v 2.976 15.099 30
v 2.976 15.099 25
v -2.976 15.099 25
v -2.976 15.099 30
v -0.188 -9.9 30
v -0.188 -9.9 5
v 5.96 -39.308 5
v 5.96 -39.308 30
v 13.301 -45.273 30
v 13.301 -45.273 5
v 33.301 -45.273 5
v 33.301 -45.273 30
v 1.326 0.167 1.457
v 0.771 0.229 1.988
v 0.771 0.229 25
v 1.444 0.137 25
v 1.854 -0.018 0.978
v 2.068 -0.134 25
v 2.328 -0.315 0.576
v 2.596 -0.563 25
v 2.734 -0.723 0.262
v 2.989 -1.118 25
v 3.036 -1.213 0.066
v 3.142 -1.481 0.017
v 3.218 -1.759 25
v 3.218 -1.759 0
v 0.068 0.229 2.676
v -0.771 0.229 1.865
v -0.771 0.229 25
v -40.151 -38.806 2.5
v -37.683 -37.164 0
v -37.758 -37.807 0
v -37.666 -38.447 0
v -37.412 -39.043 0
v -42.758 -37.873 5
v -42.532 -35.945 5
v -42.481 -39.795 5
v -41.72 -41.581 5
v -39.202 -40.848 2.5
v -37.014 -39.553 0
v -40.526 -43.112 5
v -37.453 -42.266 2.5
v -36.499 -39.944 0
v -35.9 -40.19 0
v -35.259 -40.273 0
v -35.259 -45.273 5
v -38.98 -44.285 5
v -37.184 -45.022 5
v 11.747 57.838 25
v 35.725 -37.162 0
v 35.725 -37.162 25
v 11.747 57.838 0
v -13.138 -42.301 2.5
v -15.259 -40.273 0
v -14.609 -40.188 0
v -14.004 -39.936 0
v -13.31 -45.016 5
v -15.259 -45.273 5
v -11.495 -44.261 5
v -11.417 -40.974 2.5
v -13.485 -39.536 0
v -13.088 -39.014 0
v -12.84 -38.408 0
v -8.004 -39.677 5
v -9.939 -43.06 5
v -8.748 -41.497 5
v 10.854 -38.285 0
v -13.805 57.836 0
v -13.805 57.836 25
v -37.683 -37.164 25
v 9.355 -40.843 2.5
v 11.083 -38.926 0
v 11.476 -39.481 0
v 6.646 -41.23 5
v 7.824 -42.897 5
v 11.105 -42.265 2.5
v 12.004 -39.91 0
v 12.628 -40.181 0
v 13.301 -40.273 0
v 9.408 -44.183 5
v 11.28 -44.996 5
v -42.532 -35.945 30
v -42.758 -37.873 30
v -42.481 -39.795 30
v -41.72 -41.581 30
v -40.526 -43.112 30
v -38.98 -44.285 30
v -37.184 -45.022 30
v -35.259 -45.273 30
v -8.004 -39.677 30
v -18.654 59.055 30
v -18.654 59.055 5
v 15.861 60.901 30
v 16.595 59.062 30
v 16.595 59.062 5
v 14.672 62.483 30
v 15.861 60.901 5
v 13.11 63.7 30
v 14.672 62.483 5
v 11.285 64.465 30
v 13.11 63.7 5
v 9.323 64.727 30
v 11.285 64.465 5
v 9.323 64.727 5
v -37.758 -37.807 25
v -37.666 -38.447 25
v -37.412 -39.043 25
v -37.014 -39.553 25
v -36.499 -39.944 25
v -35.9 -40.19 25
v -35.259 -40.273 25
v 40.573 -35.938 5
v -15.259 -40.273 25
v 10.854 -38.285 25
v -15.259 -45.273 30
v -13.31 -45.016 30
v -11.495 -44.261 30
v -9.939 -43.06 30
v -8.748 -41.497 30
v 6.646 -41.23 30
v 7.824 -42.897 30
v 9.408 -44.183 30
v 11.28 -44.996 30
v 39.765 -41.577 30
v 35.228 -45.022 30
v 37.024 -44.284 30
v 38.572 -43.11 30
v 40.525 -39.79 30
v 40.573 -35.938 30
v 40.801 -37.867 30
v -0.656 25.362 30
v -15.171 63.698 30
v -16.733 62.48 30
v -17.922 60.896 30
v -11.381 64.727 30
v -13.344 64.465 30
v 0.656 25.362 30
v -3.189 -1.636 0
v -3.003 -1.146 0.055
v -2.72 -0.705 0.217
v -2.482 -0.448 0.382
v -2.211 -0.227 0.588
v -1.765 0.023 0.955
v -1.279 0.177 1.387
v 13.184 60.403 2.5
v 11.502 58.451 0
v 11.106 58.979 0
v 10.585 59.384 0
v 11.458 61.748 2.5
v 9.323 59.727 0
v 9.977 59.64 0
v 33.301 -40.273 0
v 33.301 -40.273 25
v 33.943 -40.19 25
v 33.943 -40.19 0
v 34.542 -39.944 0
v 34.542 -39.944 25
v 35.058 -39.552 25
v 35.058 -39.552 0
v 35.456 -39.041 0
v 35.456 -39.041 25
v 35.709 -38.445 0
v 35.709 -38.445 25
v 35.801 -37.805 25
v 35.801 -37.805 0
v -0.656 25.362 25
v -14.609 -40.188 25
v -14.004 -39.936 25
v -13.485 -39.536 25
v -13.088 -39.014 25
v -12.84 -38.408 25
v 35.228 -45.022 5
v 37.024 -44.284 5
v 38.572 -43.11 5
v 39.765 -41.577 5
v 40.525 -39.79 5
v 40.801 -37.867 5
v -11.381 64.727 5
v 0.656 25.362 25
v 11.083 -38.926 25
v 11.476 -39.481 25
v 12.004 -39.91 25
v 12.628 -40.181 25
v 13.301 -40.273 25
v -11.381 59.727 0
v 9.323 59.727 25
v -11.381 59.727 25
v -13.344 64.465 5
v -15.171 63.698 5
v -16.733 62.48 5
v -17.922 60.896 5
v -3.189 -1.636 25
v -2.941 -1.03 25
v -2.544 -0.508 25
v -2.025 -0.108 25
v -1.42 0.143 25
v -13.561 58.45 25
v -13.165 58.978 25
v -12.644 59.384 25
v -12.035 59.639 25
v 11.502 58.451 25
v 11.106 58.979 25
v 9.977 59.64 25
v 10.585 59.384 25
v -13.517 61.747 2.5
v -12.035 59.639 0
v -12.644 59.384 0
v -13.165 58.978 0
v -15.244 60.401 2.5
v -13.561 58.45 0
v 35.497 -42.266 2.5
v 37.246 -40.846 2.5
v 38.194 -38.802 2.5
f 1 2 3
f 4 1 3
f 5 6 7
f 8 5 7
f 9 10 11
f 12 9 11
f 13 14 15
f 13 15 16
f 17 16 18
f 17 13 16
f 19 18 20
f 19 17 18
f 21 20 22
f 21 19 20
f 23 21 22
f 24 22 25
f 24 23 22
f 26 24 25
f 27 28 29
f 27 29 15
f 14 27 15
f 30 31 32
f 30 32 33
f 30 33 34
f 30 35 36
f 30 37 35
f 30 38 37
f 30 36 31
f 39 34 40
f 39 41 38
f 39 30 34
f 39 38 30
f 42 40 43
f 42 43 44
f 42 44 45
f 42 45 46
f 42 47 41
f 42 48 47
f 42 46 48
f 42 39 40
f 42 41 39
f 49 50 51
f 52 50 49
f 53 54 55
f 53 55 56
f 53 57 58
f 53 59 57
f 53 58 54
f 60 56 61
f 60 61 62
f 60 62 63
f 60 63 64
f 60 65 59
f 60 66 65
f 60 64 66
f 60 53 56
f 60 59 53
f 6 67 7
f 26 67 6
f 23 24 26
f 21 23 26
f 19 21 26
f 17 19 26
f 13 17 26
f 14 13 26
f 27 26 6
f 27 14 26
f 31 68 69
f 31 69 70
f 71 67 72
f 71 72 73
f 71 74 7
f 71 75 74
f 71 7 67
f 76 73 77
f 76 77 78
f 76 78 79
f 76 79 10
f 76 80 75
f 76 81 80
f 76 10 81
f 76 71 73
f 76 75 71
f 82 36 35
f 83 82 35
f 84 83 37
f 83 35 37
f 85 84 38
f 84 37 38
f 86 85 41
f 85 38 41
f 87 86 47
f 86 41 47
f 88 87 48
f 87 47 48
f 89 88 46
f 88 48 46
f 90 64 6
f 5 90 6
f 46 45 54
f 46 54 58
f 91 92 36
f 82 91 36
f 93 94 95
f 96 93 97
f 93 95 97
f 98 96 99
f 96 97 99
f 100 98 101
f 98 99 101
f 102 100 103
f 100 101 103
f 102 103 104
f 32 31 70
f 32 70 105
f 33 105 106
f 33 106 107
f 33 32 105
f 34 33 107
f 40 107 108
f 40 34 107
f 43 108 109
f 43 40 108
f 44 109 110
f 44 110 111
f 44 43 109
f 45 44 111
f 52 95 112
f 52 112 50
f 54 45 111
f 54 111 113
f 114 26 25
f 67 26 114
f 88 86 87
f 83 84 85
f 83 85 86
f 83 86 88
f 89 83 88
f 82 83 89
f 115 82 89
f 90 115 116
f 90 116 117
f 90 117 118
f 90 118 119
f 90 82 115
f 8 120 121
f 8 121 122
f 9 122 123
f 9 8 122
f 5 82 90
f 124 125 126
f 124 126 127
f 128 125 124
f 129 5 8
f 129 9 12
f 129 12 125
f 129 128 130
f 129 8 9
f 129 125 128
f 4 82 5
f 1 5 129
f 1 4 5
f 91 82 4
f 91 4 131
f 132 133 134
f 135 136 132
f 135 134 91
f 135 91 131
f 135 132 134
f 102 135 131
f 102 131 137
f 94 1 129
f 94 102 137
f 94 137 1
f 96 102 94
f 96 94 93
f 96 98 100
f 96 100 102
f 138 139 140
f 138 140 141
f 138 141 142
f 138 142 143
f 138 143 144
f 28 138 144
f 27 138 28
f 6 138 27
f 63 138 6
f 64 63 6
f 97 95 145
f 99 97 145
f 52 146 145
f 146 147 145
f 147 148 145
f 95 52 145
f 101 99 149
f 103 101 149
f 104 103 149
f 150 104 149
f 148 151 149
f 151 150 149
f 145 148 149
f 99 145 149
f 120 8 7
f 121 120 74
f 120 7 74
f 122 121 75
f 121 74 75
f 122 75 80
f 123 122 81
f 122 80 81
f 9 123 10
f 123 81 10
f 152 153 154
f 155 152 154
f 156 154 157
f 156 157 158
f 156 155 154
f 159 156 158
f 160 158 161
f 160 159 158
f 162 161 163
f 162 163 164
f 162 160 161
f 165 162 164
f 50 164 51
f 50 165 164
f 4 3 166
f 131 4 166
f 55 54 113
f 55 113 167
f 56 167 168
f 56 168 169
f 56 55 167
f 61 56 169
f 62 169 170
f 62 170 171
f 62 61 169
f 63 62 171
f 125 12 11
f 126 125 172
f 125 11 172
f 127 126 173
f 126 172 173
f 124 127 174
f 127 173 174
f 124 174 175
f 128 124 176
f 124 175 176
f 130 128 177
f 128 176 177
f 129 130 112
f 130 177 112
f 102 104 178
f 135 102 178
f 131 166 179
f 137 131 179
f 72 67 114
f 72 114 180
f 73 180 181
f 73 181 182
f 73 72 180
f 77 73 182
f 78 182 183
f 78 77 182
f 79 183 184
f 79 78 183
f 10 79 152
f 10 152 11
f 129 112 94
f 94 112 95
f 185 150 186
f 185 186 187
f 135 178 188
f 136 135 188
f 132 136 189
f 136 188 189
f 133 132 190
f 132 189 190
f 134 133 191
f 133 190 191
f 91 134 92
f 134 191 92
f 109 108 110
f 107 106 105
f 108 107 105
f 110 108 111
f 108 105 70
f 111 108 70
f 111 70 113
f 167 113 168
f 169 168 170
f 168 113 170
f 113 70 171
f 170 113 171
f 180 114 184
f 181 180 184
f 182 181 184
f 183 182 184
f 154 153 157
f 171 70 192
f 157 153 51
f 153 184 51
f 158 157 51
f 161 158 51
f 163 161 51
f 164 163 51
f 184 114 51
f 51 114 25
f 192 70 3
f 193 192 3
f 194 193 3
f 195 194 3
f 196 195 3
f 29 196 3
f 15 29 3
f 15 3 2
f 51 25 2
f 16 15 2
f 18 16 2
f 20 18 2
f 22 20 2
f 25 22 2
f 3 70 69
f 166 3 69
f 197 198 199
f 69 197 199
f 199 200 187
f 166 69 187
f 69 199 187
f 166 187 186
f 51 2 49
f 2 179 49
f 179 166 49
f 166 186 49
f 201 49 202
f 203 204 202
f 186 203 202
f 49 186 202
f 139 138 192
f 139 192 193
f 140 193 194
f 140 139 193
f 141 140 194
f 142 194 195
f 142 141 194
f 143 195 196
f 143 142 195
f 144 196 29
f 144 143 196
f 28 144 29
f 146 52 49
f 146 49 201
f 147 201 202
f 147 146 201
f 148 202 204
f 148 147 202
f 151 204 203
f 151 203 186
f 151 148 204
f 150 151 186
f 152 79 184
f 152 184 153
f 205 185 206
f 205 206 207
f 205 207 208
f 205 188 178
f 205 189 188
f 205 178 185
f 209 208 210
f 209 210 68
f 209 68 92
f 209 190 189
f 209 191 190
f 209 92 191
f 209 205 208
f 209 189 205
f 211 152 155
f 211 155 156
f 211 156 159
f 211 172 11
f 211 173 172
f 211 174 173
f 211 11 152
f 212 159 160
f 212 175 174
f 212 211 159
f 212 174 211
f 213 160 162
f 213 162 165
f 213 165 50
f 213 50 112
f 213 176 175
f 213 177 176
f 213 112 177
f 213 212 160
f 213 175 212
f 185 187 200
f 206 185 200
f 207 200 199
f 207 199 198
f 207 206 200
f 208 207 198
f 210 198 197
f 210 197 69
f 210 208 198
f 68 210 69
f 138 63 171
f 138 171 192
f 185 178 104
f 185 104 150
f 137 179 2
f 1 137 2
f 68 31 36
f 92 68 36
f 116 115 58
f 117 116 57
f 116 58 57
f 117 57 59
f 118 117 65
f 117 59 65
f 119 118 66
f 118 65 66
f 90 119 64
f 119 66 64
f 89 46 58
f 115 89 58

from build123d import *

# Parameters (mm, degrees)
F1_DEPTH     = 30
F3_DEPTH     = 30
F4_DEPTH     = 25
F5_T1_DEPTH  = 97.9548533656
F5_T3_DEPTH  = 20
F5_T5_DEPTH  = 20.7033743208
F5_T7_DEPTH  = 97.9794901198
F5_T9_DEPTH  = 20
F5_T12_ANGLE = 75.8911885194
F5_T14_ANGLE = 104.1088114806
F5_T16_ANGLE = 75.2928746344
F5_T20_DEPTH = 43.6443917162
F5_T23_ANGLE = 75.8339831116
F5_T25_ANGLE = 104.1660168884
F5_T27_ANGLE = 78.1908320725
F5_T31_DEPTH = 42.9024259572
F5_T37_DEPTH = 42.9024259572
F5_T41_DEPTH = 43.6443917162


# Not quite as in the source:
# - a fillet or chamfer that OpenCascade refuses, or shapes differently, is made with other operations: its cross-section is extruded or revolved along the edge and cut away or added
# - the program builds the solid bodies; features that only make, move or delete a surface that nothing else refers to are left out


with BuildPart() as f1:
    # F0 (on Top) → F1 (new body)
    with BuildSketch(Plane.XY):
        with BuildLine():
            Line((9.3227045948, 64.7266464915), (-11.3806697261, 64.7266464915))
            ThreePointArc((-11.3806697261, 64.7266464915), (-15.9925167381, 63.1411090315), (-18.6544287642, 59.0548777281))
            Line((-18.6544287642, 59.0548777281), (-42.5323117917, -35.9451222719))
            ThreePointArc((-42.5323117917, -35.9451222719), (-41.1730152936, -42.3852005206), (-35.2585527536, -45.2733535085))
            Line((-35.2585527536, -45.2733535085), (-15.2585527536, -45.2733535085))
            ThreePointArc((-15.2585527536, -45.2733535085), (-10.6776494918, -43.7118150354), (-8.004281346, -39.6774402567))
            Line((-8.004281346, -39.6774402567), (-0.1883919579, -9.9001294455))
            Line((-0.1883919579, -9.9001294455), (5.9601953638, -39.3082485958))
            ThreePointArc((5.9601953638, -39.3082485958), (8.571852392, -43.5940799733), (13.3014552741, -45.2733535085))
            Line((13.3014552741, -45.2733535085), (33.3014552741, -45.2733535085))
            ThreePointArc((33.3014552741, -45.2733535085), (39.2182193635, -42.3822473792), (40.5733853395, -35.9378608981))
            Line((40.5733853395, -35.9378608981), (16.5946346602, 59.0621391019))
            ThreePointArc((16.5946346602, 59.0621391019), (13.9315984654, 63.1434105808), (9.3227045948, 64.7266464915))
        make_face()
        with BuildLine():
            ThreePointArc((9.3227045948, 59.7266464915), (10.8590025517, 59.1989011879), (11.7466812833, 57.8384773616))
            Line((11.7466812833, 57.8384773616), (35.7254319626, -37.1615226384))
            ThreePointArc((35.7254319626, -37.1615226384), (35.2737099706, -39.3096514654), (33.3014552741, -40.2733535085))
            Line((33.3014552741, -40.2733535085), (13.3014552741, -40.2733535085))
            ThreePointArc((13.3014552741, -40.2733535085), (11.72492098, -39.7135956635), (10.8543686373, -38.2849852043))
            Line((10.8543686373, -38.2849852043), (3.2176150905, -1.7591059289))
            ThreePointArc((3.2176150905, -1.7591059289), (2.3470627478, -0.3304954698), (0.7705284538, 0.2292623753))
            Line((0.7705284538, 0.2292623753), (-0.7705284538, 0.2292623753))
            ThreePointArc((-0.7705284538, 0.2292623753), (-2.2974962077, -0.2912504491), (-3.188618923, -1.6360420419))
            Line((-3.188618923, -1.6360420419), (-12.8404622844, -38.4080490913))
            ThreePointArc((-12.8404622844, -38.4080490913), (-13.7315849996, -39.7528406842), (-15.2585527536, -40.2733535085))
            Line((-15.2585527536, -40.2733535085), (-35.2585527536, -40.2733535085))
            ThreePointArc((-35.2585527536, -40.2733535085), (-37.2300402669, -39.3106358459), (-37.6831390996, -37.1639430963))
            Line((-37.6831390996, -37.1639430963), (-13.8052560721, 57.8360569037))
            ThreePointArc((-13.8052560721, 57.8360569037), (-12.9179520634, 59.1981340048), (-11.3806697261, 59.7266464915))
            Line((-11.3806697261, 59.7266464915), (9.3227045948, 59.7266464915))
        make_face(mode=Mode.SUBTRACT)
    extrude(amount=F1_DEPTH)

    # F0 (on Top) → F3 (join)
    with BuildSketch(Plane.XY):
        with BuildLine():
            Line((35.7254319626, -37.1615226384), (11.7466812833, 57.8384773616))
            ThreePointArc((11.7466812833, 57.8384773616), (10.8590025517, 59.1989011879), (9.3227045948, 59.7266464915))
            Line((9.3227045948, 59.7266464915), (-11.3806697261, 59.7266464915))
            ThreePointArc((-11.3806697261, 59.7266464915), (-12.9179520634, 59.1981340048), (-13.8052560721, 57.8360569037))
            Line((-13.8052560721, 57.8360569037), (-37.6831390996, -37.1639430963))
            ThreePointArc((-37.6831390996, -37.1639430963), (-37.2300402669, -39.3106358459), (-35.2585527536, -40.2733535085))
            Line((-35.2585527536, -40.2733535085), (-15.2585527536, -40.2733535085))
            ThreePointArc((-15.2585527536, -40.2733535085), (-13.7315849996, -39.7528406842), (-12.8404622844, -38.4080490913))
            Line((-12.8404622844, -38.4080490913), (-3.188618923, -1.6360420419))
            ThreePointArc((-3.188618923, -1.6360420419), (-2.2974962077, -0.2912504491), (-0.7705284538, 0.2292623753))
            Line((-0.7705284538, 0.2292623753), (0.7705284538, 0.2292623753))
            ThreePointArc((0.7705284538, 0.2292623753), (2.3470627478, -0.3304954698), (3.2176150905, -1.7591059289))
            Line((3.2176150905, -1.7591059289), (10.8543686373, -38.2849852043))
            ThreePointArc((10.8543686373, -38.2849852043), (11.72492098, -39.7135956635), (13.3014552741, -40.2733535085))
            Line((13.3014552741, -40.2733535085), (33.3014552741, -40.2733535085))
            ThreePointArc((33.3014552741, -40.2733535085), (35.2737099706, -39.3096514654), (35.7254319626, -37.1615226384))
        make_face()
        Polygon((2.9763113208, 15.0989185788), (-2.9763113208, 15.0989185788), (-0.655874512, 25.3615314645), (0.655874512, 25.3615314645), align=None, mode=Mode.SUBTRACT)
    extrude(amount=F3_DEPTH)

    # F0 (on Top) → F4 (cut)
    with BuildSketch(Plane.XY):
        with BuildLine():
            Line((35.7254319626, -37.1615226384), (11.7466812833, 57.8384773616))
            ThreePointArc((11.7466812833, 57.8384773616), (10.8590025517, 59.1989011879), (9.3227045948, 59.7266464915))
            Line((9.3227045948, 59.7266464915), (-11.3806697261, 59.7266464915))
            ThreePointArc((-11.3806697261, 59.7266464915), (-12.9179520634, 59.1981340048), (-13.8052560721, 57.8360569037))
            Line((-13.8052560721, 57.8360569037), (-37.6831390996, -37.1639430963))
            ThreePointArc((-37.6831390996, -37.1639430963), (-37.2300402669, -39.3106358459), (-35.2585527536, -40.2733535085))
            Line((-35.2585527536, -40.2733535085), (-15.2585527536, -40.2733535085))
            ThreePointArc((-15.2585527536, -40.2733535085), (-13.7315849996, -39.7528406842), (-12.8404622844, -38.4080490913))
            Line((-12.8404622844, -38.4080490913), (-3.188618923, -1.6360420419))
            ThreePointArc((-3.188618923, -1.6360420419), (-2.2974962077, -0.2912504491), (-0.7705284538, 0.2292623753))
            Line((-0.7705284538, 0.2292623753), (0.7705284538, 0.2292623753))
            ThreePointArc((0.7705284538, 0.2292623753), (2.3470627478, -0.3304954698), (3.2176150905, -1.7591059289))
            Line((3.2176150905, -1.7591059289), (10.8543686373, -38.2849852043))
            ThreePointArc((10.8543686373, -38.2849852043), (11.72492098, -39.7135956635), (13.3014552741, -40.2733535085))
            Line((13.3014552741, -40.2733535085), (33.3014552741, -40.2733535085))
            ThreePointArc((33.3014552741, -40.2733535085), (35.2737099706, -39.3096514654), (35.7254319626, -37.1615226384))
        make_face()
        Polygon((2.9763113208, 15.0989185788), (-2.9763113208, 15.0989185788), (-0.655874512, 25.3615314645), (0.655874512, 25.3615314645), align=None, mode=Mode.SUBTRACT)
    extrude(amount=F4_DEPTH, mode=Mode.SUBTRACT)

    # F5: chamfer of 5 on 1 edges, made by hand

    # F5_s2 → F5_t1 (cut)
    with BuildSketch(Plane(origin=(12.8527529512, 51.135669312, 0), x_dir=(0, 0, 1), z_dir=(-0.2437641649, -0.9698345384, 0))):
        Polygon((0, 27.4871722621), (5, 32.4871722621), (0, 32.4871722621), align=None)
    extrude(amount=F5_T1_DEPTH, mode=Mode.SUBTRACT)

    # F5_s4 → F5_t3 (cut)
    with BuildSketch(Plane.YZ.offset(-35.2585527536)):
        Polygon((-40.2733535085, 0), (-45.2733535085, 5), (-45.2733535085, 0), align=None)
    extrude(amount=F5_T3_DEPTH, mode=Mode.SUBTRACT)

    # F5_s6 → F5_t5 (cut)
    with BuildSketch(Plane.YZ.offset(-11.3806697261)):
        Polygon((64.7266464915, 5), (59.7266464915, 0), (64.7266464915, 0), align=None)
    extrude(amount=F5_T5_DEPTH, mode=Mode.SUBTRACT)

    # F5_s8 → F5_t7 (cut)
    with BuildSketch(Plane(origin=(10.9578014799, -43.4130682832, 0), x_dir=(0, 0, 1), z_dir=(-0.2447323481, 0.9695906754, 0))):
        Polygon((5, 30.5444190123), (0, 25.5444190123), (0, 30.5444190123), align=None)
    extrude(amount=F5_T7_DEPTH, mode=Mode.SUBTRACT)

    # F5_s10 → F5_t9 (cut)
    with BuildSketch(Plane.YZ.offset(13.3014552741)):
        Polygon((-40.2733535085, 0), (-45.2733535085, 5), (-45.2733535085, 0), align=None)
    extrude(amount=F5_T9_DEPTH, mode=Mode.SUBTRACT)

    # F5_s11 → F5_t12 (revolve, cut)
    with BuildSketch(Plane.YZ.offset(-11.3806697261)):
        Polygon((59.7266464915, 0), (64.7266464915, 5), (64.7266464915, 0), align=None)
    revolve(axis=Axis((-11.3806697261, 57.2266464915, 0), (0, 0, 1)), revolution_arc=F5_T12_ANGLE, mode=Mode.SUBTRACT)

    # F5_s13 → F5_t14 (revolve, cut)
    with BuildSketch(Plane(origin=(-11.0251300763, -43.864330688, 0), x_dir=(0, 0, 1), z_dir=(0.2437641649, 0.9698345384, 0))):
        Polygon((0, -27.4871722621), (5, -32.4871722621), (0, -32.4871722621), align=None)
    revolve(axis=Axis((-35.2585527536, -37.7733535085, 0), (0, 0, 1)), revolution_arc=F5_T14_ANGLE, mode=Mode.SUBTRACT)

    # F5_s15 → F5_t16 (revolve, cut)
    with BuildSketch(Plane.YZ.offset(-15.2585527536)):
        Polygon((-40.2733535085, 0), (-45.2733535085, 5), (-45.2733535085, 0), align=None)
    revolve(axis=Axis((-15.2585527536, -37.7733535085, 0), (0, 0, 1)), revolution_arc=F5_T16_ANGLE, mode=Mode.SUBTRACT)


with BuildPart() as f5_tool18:
    # F5_s19 → F5_t20 (new body)
    with BuildSketch(Plane(origin=(-10.2591099413, -39.0855973263, 0), x_dir=(0, 0, 1), z_dir=(0.2538782331, 0.9672361877, 0))):
        Polygon((0, -2.6687921481), (5, 2.3312078519), (0, 2.3312078519), align=None)
    extrude(amount=F5_T20_DEPTH)

    split(bisect_by=Plane(origin=(-2.1637067448, -0.4523832276, 0), x_dir=(0, 0, 1), z_dir=(-0.9788346547, -0.2046526783, 0)), keep=Keep.TOP)


with BuildPart() as f1_1:
    add(f1.part)

    # F5_t17: cut F5_tool18
    add(f5_tool18.part, mode=Mode.SUBTRACT)

    # F5_s22 → F5_t23 (revolve, cut)
    with BuildSketch(Plane(origin=(-13.0209491994, 51.5869317168, 0), x_dir=(0, 0, 1), z_dir=(0.2447323481, -0.9695906754, 0))):
        Polygon((5, -30.5444190123), (0, -25.5444190123), (0, -30.5444190123), align=None)
    revolve(axis=Axis((9.3227045948, 57.2266464915, 0), (0, 0, 1)), revolution_arc=F5_T23_ANGLE, mode=Mode.SUBTRACT)

    # F5_s24 → F5_t25 (revolve, cut)
    with BuildSketch(Plane.YZ.offset(33.3014552741)):
        Polygon((-40.2733535085, 0), (-45.2733535085, 5), (-45.2733535085, 0), align=None)
    revolve(axis=Axis((33.3014552741, -37.7733535085, 0), (0, 0, 1)), revolution_arc=F5_T25_ANGLE, mode=Mode.SUBTRACT)

    # F5_s26 → F5_t27 (revolve, cut)
    with BuildSketch(Plane(origin=(8.1239021086, -38.8558653682, 0), x_dir=(0, 0, 1), z_dir=(-0.2046526783, 0.9788346547, 0))):
        Polygon((0, 2.7895074164), (5, -2.2104925836), (0, -2.2104925836), align=None)
    revolve(axis=Axis((13.3014552741, -37.7733535085, 0), (0, 0, 1)), revolution_arc=F5_T27_ANGLE, mode=Mode.SUBTRACT)


with BuildPart() as f5_tool29:
    # F5_s30 → F5_t31 (new body)
    with BuildSketch(Plane(origin=(-0.6561942692, 3.1385159299, 0), x_dir=(0, 0, 1), z_dir=(0.2046526783, -0.9788346547, 0))):
        Polygon((0, -2.7895074164), (5, 2.2104925836), (0, 2.2104925836), align=None)
    extrude(amount=F5_T31_DEPTH)

    split(bisect_by=Plane(origin=(2.2548285953, -0.5918429304, 0), x_dir=(0, 0, 1), z_dir=(0.9672361877, -0.2538782331, 0)), keep=Keep.TOP)


with BuildPart() as f1_2:
    add(f1_1.part)

    # F5_t28: cut F5_tool29
    add(f5_tool29.part, mode=Mode.SUBTRACT)


with BuildPart() as f5_tool35:
    # F5_s36 → F5_t37 (new body)
    with BuildSketch(Plane(origin=(-0.6561942692, 3.1385159299, 0), x_dir=(0, 0, 1), z_dir=(0.2046526783, -0.9788346547, 0))):
        Polygon((0, -2.7895074164), (5, 2.2104925836), (0, 2.2104925836), align=None)
    extrude(amount=F5_T37_DEPTH)

    split(bisect_by=Plane(origin=(2.2548285953, -0.5918429304, 0), x_dir=(0, 0, 1), z_dir=(-0.9672361877, 0.2538782331, 0)), keep=Keep.TOP)


with BuildPart() as f5_tool39:
    # F5_s40 → F5_t41 (new body)
    with BuildSketch(Plane(origin=(-10.2591099413, -39.0855973263, 0), x_dir=(0, 0, 1), z_dir=(0.2538782331, 0.9672361877, 0))):
        Polygon((0, -2.6687921481), (5, 2.3312078519), (0, 2.3312078519), align=None)
    extrude(amount=F5_T41_DEPTH)

    split(bisect_by=Plane(origin=(-2.1637067448, -0.4523832276, 0), x_dir=(0, 0, 1), z_dir=(0.9788346547, 0.2046526783, 0)), keep=Keep.TOP)


with BuildPart() as f5_tool35_1:
    add(f5_tool35.part)

    # F5_t43: intersect F5_tool39
    add(f5_tool39.part, mode=Mode.INTERSECT)


with BuildPart() as f1_3:
    add(f1_2.part)

    # F5_t33: cut F5_tool35
    add(f5_tool35_1.part, mode=Mode.SUBTRACT)


solid = f1_3.part
